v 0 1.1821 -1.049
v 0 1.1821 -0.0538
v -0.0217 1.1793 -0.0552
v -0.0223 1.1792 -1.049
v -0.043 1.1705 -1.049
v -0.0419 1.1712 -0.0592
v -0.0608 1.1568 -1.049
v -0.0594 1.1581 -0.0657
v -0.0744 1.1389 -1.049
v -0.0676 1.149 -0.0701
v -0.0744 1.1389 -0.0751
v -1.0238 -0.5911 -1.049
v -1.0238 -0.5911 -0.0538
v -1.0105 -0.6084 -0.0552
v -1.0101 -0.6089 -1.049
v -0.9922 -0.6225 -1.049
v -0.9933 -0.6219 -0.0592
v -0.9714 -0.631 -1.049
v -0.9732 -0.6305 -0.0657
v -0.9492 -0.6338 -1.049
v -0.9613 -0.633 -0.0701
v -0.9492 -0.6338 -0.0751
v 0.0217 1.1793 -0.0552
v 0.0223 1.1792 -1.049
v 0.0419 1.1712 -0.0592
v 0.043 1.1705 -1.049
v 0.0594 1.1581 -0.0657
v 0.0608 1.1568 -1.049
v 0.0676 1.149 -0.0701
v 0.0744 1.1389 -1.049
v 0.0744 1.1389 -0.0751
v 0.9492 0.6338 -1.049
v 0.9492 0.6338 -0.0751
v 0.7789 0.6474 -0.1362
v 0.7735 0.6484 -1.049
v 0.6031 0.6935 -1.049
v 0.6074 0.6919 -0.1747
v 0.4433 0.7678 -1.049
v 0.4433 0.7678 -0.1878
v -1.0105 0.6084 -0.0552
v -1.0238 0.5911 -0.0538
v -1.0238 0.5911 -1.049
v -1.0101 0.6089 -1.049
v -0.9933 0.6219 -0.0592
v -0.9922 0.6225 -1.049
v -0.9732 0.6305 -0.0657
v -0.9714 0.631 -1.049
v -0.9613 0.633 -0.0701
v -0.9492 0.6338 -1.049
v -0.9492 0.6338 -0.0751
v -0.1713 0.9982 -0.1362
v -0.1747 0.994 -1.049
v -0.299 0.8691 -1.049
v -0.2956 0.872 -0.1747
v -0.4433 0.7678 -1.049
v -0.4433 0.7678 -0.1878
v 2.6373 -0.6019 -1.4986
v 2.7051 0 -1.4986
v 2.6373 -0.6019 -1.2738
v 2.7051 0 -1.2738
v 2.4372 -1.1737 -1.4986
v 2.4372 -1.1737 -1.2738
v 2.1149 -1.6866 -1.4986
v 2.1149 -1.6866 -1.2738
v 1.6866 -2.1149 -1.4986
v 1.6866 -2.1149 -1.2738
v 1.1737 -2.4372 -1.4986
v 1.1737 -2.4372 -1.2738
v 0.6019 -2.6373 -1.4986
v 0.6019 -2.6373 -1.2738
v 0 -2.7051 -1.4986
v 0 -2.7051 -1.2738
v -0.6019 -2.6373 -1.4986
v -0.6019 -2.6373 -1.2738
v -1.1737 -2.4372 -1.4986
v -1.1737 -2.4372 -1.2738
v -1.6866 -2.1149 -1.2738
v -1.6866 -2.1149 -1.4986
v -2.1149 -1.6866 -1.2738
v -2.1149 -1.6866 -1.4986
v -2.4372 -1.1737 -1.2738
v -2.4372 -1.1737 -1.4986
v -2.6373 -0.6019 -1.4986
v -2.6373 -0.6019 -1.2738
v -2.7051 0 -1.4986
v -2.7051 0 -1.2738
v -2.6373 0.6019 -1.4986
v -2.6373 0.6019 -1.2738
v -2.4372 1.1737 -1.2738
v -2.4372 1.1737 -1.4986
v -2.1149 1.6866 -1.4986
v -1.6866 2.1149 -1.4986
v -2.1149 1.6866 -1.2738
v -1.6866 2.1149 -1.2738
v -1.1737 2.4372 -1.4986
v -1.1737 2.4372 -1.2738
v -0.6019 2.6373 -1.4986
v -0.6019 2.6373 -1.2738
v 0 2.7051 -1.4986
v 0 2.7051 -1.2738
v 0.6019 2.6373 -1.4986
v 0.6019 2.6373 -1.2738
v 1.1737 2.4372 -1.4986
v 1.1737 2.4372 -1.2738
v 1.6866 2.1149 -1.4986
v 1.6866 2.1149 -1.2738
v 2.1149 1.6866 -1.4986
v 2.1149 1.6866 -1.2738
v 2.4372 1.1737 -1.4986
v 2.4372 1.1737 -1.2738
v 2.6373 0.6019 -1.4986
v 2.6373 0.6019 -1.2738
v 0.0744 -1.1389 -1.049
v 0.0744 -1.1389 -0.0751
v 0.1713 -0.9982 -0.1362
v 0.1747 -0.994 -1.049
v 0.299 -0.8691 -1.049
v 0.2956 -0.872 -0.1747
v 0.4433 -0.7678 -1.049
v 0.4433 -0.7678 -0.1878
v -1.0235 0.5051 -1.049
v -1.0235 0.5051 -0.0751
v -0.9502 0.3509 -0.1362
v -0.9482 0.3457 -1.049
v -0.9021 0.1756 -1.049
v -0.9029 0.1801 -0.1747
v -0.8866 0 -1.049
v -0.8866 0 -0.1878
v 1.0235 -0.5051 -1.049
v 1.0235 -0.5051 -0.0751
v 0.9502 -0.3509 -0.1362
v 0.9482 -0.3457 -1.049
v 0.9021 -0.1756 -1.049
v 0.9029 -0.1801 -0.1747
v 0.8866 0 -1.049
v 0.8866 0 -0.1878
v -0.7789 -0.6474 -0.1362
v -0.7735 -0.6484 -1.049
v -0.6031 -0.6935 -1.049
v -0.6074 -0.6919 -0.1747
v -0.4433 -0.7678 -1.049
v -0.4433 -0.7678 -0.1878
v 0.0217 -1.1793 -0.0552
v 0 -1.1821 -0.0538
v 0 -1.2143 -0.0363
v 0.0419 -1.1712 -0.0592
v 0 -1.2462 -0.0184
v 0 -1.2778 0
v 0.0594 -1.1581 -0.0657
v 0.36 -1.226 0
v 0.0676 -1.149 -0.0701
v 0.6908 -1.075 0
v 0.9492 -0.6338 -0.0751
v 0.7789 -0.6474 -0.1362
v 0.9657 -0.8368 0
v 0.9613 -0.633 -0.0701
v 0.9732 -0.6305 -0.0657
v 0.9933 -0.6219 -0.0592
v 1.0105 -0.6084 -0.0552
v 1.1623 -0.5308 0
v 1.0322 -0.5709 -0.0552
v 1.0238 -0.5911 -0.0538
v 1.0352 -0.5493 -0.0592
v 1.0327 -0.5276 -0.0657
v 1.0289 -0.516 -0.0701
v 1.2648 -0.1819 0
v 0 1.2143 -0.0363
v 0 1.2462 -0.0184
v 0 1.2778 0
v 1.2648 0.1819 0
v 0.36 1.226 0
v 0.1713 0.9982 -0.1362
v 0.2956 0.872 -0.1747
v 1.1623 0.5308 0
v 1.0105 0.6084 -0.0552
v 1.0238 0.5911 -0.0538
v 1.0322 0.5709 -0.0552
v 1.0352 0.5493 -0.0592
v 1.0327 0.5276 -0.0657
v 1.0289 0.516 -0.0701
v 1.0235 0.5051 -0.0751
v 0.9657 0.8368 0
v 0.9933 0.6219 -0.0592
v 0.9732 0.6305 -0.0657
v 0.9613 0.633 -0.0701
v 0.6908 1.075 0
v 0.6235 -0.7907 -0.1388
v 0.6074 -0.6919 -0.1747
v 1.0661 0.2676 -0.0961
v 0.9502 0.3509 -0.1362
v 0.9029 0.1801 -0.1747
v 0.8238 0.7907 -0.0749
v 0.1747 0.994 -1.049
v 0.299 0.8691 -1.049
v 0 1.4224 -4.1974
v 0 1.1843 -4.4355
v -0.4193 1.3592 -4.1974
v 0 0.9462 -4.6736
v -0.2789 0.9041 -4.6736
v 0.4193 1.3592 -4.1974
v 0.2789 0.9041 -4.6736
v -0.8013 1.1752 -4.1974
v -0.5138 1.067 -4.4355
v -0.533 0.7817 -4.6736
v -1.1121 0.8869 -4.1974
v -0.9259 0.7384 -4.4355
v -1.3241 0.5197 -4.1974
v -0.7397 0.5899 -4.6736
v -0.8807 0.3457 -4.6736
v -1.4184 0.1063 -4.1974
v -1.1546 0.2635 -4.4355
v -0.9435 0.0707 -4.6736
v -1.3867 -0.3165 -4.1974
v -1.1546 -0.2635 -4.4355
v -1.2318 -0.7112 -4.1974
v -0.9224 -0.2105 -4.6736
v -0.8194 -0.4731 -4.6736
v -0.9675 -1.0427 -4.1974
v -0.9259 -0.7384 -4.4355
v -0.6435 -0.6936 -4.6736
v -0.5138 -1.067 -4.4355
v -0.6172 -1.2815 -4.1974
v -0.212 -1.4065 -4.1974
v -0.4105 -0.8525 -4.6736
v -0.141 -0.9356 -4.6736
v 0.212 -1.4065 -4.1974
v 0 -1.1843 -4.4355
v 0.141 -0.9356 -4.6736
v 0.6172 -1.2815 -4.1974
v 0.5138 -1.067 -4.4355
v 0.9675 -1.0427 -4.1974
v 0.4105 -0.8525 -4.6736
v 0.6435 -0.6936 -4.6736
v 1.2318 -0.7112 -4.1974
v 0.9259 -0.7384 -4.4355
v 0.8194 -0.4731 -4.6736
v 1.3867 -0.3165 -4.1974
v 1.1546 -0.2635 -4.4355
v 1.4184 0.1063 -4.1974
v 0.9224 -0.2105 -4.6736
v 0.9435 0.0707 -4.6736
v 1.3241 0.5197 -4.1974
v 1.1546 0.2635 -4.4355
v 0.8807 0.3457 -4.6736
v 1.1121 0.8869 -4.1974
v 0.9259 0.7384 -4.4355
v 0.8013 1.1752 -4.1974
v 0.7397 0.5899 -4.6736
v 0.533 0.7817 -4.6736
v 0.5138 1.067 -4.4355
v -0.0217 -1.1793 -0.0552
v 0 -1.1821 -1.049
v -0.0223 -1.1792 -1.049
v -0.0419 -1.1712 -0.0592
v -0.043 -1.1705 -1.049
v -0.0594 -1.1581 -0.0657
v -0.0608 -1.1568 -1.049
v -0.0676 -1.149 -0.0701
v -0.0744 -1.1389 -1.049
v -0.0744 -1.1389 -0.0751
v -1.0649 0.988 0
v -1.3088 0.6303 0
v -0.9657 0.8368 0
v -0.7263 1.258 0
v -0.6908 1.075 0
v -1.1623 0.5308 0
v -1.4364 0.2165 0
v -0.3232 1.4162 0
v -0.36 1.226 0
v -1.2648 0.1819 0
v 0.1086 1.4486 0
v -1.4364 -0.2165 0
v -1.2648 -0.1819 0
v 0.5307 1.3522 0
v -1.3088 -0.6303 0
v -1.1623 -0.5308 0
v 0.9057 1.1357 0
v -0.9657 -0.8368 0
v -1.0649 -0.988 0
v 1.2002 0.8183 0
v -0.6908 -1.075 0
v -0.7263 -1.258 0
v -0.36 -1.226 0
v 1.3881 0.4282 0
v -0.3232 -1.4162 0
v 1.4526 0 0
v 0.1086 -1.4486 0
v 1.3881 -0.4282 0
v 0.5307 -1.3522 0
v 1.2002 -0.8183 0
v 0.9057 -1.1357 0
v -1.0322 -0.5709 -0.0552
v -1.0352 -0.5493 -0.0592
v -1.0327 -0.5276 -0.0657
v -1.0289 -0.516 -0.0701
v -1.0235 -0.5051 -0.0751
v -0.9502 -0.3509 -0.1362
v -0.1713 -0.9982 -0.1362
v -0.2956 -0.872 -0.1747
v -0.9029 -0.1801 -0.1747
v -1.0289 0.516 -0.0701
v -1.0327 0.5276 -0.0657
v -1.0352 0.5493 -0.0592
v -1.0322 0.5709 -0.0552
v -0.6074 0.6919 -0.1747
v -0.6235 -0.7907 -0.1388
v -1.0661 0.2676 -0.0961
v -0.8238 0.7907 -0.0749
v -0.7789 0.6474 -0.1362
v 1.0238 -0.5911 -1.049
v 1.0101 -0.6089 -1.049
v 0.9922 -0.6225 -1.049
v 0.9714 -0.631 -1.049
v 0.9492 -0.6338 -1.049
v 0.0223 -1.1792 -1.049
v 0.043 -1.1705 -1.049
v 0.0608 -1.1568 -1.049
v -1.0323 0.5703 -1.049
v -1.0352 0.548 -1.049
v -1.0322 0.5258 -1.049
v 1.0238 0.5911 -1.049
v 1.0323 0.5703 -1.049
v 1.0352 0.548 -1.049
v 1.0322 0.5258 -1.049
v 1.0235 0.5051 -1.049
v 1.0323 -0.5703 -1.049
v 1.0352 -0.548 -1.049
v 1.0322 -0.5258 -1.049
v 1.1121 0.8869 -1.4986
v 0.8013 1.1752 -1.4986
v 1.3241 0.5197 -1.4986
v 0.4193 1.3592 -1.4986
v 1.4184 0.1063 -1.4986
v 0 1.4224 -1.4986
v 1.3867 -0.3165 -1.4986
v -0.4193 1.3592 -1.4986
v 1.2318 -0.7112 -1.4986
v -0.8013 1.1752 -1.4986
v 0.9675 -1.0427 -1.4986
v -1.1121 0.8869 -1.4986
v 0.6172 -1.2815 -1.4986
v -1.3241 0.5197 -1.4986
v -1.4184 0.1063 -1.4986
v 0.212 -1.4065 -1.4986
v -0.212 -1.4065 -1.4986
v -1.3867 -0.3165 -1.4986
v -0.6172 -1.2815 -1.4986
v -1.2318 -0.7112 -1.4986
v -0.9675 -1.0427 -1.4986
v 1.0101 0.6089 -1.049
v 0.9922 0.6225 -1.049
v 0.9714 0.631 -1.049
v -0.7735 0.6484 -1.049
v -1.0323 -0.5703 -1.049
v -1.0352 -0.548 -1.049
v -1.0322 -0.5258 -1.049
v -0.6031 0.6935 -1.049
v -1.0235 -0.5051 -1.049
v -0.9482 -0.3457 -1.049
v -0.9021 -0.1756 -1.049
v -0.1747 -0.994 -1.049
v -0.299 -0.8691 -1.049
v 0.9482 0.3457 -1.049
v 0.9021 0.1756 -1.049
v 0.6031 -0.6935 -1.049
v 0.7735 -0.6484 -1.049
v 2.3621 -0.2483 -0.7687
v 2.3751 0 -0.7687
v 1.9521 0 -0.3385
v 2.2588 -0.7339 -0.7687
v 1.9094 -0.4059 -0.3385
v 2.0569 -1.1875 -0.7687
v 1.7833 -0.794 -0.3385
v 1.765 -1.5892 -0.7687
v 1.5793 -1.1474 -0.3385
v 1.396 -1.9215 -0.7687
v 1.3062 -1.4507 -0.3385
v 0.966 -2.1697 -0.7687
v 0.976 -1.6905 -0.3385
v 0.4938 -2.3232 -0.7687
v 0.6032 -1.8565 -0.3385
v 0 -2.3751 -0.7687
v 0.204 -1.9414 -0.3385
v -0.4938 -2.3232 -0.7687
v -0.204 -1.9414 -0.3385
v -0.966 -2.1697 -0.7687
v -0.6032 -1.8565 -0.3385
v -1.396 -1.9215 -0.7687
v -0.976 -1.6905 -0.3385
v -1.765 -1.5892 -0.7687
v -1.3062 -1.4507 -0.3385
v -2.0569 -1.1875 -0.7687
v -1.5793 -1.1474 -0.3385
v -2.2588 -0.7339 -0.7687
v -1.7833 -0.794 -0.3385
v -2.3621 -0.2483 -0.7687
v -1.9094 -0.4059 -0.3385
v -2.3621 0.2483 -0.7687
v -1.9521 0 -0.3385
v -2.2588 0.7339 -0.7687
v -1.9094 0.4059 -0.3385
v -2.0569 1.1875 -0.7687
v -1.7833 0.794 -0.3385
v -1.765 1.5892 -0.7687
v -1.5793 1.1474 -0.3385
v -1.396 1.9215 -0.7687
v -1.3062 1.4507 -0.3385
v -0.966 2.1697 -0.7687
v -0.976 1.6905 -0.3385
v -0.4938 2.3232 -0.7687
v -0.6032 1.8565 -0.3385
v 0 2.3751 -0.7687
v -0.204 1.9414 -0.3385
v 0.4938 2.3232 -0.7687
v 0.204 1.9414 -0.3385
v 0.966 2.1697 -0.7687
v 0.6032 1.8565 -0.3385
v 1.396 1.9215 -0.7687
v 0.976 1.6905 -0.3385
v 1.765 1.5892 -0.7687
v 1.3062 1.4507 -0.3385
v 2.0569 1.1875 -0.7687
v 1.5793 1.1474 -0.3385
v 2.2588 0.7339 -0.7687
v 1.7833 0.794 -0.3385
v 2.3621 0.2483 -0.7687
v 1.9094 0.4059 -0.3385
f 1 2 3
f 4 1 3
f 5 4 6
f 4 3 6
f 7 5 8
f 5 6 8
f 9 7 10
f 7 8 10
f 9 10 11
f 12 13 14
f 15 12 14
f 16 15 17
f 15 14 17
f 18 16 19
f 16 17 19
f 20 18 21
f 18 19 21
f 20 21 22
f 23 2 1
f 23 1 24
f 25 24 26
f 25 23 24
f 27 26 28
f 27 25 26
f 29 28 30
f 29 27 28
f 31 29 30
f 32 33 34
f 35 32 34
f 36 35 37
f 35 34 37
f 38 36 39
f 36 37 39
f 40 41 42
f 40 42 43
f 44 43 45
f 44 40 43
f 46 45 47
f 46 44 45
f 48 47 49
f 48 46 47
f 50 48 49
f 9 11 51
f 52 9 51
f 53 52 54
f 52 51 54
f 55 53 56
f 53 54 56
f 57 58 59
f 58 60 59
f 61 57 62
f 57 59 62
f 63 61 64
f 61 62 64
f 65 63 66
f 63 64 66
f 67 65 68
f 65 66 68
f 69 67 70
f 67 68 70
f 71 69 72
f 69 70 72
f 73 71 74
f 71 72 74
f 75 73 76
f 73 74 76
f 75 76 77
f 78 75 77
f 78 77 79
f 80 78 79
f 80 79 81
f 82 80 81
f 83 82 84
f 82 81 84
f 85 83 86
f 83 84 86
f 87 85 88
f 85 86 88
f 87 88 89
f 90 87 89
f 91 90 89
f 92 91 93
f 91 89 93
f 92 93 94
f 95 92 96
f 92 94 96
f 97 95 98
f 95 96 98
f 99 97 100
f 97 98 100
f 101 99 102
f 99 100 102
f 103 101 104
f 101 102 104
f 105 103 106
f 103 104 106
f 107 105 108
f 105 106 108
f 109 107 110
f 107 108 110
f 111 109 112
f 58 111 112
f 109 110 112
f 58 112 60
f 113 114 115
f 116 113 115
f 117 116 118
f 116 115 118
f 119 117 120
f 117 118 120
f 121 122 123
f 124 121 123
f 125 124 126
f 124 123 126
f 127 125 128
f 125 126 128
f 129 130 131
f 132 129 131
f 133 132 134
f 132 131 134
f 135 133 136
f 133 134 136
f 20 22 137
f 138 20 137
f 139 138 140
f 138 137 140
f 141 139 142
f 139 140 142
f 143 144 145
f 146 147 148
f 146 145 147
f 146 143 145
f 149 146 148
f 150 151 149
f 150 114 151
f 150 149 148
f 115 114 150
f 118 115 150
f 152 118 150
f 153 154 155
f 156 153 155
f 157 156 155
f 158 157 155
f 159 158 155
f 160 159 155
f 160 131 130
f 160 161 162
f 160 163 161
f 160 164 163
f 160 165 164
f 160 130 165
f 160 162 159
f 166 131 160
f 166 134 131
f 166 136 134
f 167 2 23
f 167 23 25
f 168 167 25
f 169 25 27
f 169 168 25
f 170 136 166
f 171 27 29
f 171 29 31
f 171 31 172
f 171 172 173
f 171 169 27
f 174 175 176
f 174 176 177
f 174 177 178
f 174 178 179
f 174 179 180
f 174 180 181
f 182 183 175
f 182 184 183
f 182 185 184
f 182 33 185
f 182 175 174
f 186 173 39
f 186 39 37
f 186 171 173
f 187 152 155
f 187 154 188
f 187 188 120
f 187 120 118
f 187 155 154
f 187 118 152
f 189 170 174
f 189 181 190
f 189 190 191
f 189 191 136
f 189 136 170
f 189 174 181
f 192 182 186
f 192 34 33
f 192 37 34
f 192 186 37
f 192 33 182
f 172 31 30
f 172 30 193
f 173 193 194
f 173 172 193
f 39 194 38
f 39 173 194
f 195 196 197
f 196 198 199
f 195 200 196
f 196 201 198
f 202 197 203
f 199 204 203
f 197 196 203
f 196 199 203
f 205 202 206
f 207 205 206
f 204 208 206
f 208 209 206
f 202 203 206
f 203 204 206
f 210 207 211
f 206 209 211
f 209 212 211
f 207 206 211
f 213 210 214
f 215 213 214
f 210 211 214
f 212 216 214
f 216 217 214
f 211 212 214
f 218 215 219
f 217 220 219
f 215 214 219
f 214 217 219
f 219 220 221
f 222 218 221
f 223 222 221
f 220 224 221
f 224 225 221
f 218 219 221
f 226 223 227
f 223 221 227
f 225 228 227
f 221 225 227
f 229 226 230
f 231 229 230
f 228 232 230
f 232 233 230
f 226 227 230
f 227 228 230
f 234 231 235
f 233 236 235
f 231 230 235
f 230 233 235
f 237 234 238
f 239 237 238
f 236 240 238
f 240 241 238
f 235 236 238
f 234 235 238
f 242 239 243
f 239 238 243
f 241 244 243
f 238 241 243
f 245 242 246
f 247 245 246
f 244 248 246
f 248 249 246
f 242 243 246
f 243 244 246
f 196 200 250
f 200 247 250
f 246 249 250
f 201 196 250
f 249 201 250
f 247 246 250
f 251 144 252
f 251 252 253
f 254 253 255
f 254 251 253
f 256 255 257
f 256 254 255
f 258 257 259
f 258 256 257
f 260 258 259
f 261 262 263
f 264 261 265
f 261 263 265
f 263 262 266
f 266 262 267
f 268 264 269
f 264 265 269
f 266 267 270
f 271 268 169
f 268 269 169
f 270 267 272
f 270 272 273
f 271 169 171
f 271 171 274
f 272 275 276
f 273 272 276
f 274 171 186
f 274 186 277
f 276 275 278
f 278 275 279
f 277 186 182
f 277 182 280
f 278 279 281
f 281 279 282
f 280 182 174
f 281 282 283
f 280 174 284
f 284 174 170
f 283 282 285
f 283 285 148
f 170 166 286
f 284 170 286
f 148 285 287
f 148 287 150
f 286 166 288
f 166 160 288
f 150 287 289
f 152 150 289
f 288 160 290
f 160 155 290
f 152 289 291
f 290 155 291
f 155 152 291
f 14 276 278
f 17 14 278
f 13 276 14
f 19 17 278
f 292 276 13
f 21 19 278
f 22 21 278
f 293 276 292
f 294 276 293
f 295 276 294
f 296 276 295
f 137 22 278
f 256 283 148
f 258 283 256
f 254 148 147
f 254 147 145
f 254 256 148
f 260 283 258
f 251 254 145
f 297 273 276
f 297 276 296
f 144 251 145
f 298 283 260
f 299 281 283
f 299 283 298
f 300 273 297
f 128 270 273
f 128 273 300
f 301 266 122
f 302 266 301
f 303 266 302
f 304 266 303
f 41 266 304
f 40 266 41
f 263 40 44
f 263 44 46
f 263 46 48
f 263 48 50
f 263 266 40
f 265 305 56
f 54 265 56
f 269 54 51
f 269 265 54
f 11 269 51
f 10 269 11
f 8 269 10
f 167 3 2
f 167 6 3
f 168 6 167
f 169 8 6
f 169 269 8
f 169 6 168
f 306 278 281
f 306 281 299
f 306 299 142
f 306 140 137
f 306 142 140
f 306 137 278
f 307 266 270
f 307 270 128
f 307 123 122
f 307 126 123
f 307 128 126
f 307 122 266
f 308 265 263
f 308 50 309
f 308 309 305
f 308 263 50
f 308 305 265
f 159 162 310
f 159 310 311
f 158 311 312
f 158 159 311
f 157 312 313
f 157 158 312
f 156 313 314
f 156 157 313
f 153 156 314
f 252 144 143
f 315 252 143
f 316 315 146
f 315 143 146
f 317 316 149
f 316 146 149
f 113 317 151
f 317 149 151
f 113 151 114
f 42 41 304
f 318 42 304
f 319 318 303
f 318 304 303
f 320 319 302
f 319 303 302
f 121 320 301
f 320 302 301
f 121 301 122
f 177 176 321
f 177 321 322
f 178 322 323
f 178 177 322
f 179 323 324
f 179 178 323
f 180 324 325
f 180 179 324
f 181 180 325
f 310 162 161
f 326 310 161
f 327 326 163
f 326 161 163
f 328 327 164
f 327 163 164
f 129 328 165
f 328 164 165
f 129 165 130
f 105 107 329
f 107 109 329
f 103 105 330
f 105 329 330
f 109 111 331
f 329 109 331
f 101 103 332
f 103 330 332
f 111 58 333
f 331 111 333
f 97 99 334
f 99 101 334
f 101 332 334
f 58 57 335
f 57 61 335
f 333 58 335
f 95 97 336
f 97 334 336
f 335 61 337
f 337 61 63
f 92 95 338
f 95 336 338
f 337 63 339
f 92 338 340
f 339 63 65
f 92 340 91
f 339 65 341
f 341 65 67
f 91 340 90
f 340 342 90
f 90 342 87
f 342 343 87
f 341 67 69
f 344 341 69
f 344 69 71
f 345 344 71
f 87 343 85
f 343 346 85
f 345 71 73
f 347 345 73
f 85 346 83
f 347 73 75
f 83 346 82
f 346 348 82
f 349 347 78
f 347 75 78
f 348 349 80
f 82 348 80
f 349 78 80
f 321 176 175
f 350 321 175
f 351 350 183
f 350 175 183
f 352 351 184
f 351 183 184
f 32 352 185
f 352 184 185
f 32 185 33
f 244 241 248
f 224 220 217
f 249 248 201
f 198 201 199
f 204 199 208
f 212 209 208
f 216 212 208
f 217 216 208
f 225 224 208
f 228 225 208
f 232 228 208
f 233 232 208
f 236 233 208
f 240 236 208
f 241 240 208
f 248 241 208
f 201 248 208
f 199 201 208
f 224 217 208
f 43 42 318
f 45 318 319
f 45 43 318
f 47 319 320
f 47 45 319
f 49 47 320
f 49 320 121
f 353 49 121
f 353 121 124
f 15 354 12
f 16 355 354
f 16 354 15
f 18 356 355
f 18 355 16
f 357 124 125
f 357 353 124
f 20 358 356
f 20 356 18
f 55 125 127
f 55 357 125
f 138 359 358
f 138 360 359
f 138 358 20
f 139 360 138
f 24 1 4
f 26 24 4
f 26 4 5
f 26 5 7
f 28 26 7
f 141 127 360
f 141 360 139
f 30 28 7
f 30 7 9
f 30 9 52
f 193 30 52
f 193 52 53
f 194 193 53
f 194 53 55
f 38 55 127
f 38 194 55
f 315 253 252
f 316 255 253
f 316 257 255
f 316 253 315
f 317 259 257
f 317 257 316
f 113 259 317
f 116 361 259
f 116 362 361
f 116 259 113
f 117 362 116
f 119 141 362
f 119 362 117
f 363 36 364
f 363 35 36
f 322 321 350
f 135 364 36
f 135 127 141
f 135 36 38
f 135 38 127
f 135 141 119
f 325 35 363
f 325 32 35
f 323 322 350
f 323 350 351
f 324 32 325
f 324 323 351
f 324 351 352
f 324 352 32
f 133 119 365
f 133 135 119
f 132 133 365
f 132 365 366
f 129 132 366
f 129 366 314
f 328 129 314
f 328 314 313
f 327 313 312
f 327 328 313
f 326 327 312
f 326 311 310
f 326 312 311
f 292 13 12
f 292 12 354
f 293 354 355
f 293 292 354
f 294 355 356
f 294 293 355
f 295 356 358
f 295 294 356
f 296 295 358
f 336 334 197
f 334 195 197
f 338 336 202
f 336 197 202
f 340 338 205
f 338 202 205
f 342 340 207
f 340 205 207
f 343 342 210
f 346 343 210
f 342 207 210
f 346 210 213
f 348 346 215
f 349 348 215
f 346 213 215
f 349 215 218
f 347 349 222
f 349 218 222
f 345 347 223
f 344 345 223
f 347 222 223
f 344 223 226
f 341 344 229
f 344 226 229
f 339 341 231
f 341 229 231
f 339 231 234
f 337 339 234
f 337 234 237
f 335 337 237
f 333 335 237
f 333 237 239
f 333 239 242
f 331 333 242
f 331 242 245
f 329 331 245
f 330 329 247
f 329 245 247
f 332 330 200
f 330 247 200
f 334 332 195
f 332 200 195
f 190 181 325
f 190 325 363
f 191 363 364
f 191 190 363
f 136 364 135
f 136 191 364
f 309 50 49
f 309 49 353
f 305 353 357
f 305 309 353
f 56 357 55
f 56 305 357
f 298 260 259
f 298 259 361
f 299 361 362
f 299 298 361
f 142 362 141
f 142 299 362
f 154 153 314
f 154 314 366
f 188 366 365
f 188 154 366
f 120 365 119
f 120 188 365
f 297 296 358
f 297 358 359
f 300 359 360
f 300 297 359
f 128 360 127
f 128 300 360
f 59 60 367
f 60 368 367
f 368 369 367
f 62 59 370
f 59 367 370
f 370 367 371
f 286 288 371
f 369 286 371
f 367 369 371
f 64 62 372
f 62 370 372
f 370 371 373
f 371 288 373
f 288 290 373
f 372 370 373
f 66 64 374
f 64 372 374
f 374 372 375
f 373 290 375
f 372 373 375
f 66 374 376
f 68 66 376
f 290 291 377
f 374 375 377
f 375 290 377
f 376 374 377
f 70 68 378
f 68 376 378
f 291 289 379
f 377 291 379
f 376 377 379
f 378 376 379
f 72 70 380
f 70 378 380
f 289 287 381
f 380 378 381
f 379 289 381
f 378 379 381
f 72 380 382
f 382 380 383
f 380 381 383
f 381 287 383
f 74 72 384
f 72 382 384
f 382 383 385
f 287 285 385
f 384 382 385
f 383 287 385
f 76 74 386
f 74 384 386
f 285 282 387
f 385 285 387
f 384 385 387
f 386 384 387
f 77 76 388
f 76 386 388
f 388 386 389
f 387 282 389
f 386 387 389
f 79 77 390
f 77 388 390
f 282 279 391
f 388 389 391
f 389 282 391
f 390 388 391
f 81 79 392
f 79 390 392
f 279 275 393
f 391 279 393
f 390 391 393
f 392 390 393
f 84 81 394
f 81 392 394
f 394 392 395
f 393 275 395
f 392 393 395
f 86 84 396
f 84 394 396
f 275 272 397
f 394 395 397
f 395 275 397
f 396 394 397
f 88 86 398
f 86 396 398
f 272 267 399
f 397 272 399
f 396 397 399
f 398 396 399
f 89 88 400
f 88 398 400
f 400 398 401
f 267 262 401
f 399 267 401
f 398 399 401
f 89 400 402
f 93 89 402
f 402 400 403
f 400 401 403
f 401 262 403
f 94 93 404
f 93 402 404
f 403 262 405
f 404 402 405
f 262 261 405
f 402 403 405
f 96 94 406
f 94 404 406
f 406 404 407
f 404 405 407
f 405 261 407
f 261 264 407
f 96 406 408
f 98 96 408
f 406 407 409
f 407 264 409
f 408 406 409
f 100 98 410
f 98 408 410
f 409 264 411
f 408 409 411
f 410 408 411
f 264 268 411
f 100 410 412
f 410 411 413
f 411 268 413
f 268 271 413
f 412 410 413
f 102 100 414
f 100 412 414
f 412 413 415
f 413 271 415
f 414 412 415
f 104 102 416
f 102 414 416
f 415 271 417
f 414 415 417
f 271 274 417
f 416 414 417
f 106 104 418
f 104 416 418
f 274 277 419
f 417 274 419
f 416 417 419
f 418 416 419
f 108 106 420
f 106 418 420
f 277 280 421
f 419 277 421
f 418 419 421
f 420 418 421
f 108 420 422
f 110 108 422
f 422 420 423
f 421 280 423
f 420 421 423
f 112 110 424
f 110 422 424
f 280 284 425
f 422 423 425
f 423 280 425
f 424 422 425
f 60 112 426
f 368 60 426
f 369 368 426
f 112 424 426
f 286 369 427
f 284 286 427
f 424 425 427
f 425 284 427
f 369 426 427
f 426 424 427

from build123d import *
from build123d.topology import SkipClean

# Parameters (mm, degrees)
CUT_EXTRUDE1_DEPTH       = 1.04902
CIRPATTERN1_COUNT        = 6
CIRPATTERN1_COPY_1_DEPTH = 1.04902
CIRPATTERN1_COPY_2_DEPTH = 1.04902
CIRPATTERN1_COPY_3_DEPTH = 1.04902
CIRPATTERN1_COPY_4_DEPTH = 1.04902
CIRPATTERN1_COPY_5_DEPTH = 1.04902


with BuildPart() as part:
    # Sketch2 → Revolve1 (revolve)
    with BuildSketch(Plane(origin=(0, 0, 0), x_dir=(0, 0, -1), z_dir=(1, 0, 0))):
        Polygon((1.4986, 1.4224), (4.19735, 1.4224), (4.6736, 0.94615), (4.6736, 0), (1.4986, 0), align=None)
    revolve(axis=Axis((0, 0, -4.6736), (0, 0, 1)))


with BuildPart() as body_2:
    # Sketch3 → Revolve2 (revolve)
    with BuildSketch(Plane(origin=(0, 0, 0), x_dir=(0, 0, -1), z_dir=(1, 0, 0))):
        with BuildLine():
            Line((1.4986, 0), (1.4986, 2.7051))
            Line((1.4986, 2.7051), (1.27381, 2.7051))
            ThreePointArc((1.27381, 2.7051), (0.543126817, 2.17424602), (0, 1.4526387))
            Line((0, 1.4526387), (0, 0))
            Line((0, 0), (1.4986, 0))
        make_face()
    revolve(axis=Axis((0, 0, 0), (0, 0, -1)))

    # Combine1: union part
    add(part.part)

    # Sketch4 → Cut-Extrude1 (cut)
    with BuildSketch(Plane.XY):
        with BuildLine():
            Line((-0.886596525, 0), (0, 0))
            Line((0, 0), (-1.023753485, 0.59106435))
            ThreePointArc((-1.023753485, 0.59106435), (-1.035216975, 0.548031955), (-1.023503515, 0.505066928))
            ThreePointArc((-1.023503515, 0.505066928), (-0.921429906, 0.261646769), (-0.886596525, 0))
        make_face()
    cut_extrude1 = extrude(amount=-CUT_EXTRUDE1_DEPTH, mode=Mode.SUBTRACT)

    # Mirror1: Cut-Extrude1 across plane
    add(cut_extrude1.mirror(Plane.ZX), mode=Mode.SUBTRACT)

    # CirPattern1: Cut-Extrude1 ×6 about axis
    cirpattern1_axis = Axis((0, 0, -4.6736), (0, 0, -1))
    for i in range(1, CIRPATTERN1_COUNT):
        add(cut_extrude1.rotate(cirpattern1_axis, i * 360 / CIRPATTERN1_COUNT), mode=Mode.SUBTRACT)

    # CirPattern1 copy 1 sketch → CirPattern1 copy 1 (cut)
    with BuildSketch(Plane(origin=(0, 0, 0), x_dir=(0.5000000000000001, -0.8660254037844386, 0), z_dir=(0, 0, 1))):
        with BuildLine():
            Line((-0.886596525, 0), (0, 0))
            Line((0, 0), (-1.023753485, -0.59106435))
            ThreePointArc((-1.023753485, -0.59106435), (-1.035216975, -0.548031955), (-1.023503515, -0.505066928))
            ThreePointArc((-1.023503515, -0.505066928), (-0.921429906, -0.261646769), (-0.886596525, 0))
        make_face()
    extrude(amount=-CIRPATTERN1_COPY_1_DEPTH, mode=Mode.SUBTRACT)

    # CirPattern1 copy 2 sketch → CirPattern1 copy 2 (cut)
    with BuildSketch(Plane(origin=(0, 0, 0), x_dir=(-0.4999999999999998, -0.8660254037844387, 0), z_dir=(0, 0, 1))):
        with BuildLine():
            Line((-0.886596525, 0), (0, 0))
            Line((0, 0), (-1.023753485, -0.59106435))
            ThreePointArc((-1.023753485, -0.59106435), (-1.035216975, -0.548031955), (-1.023503515, -0.505066928))
            ThreePointArc((-1.023503515, -0.505066928), (-0.921429906, -0.261646769), (-0.886596525, 0))
        make_face()
    extrude(amount=-CIRPATTERN1_COPY_2_DEPTH, mode=Mode.SUBTRACT)

    # CirPattern1 copy 3 sketch → CirPattern1 copy 3 (cut)
    with BuildSketch(Plane(origin=(0, 0, 0), x_dir=(-1, 0, 0), z_dir=(0, 0, 1))):
        with BuildLine():
            Line((-0.886596525, 0), (0, 0))
            Line((0, 0), (-1.023753485, -0.59106435))
            ThreePointArc((-1.023753485, -0.59106435), (-1.035216975, -0.548031955), (-1.023503515, -0.505066928))
            ThreePointArc((-1.023503515, -0.505066928), (-0.921429906, -0.261646769), (-0.886596525, 0))
        make_face()
    extrude(amount=-CIRPATTERN1_COPY_3_DEPTH, mode=Mode.SUBTRACT)

    # CirPattern1 copy 4 sketch → CirPattern1 copy 4 (cut)
    with BuildSketch(Plane(origin=(0, 0, 0), x_dir=(-0.5000000000000004, 0.8660254037844384, 0), z_dir=(0, 0, 1))):
        with BuildLine():
            Line((-0.886596525, 0), (0, 0))
            Line((0, 0), (-1.023753485, -0.59106435))
            ThreePointArc((-1.023753485, -0.59106435), (-1.035216975, -0.548031955), (-1.023503515, -0.505066928))
            ThreePointArc((-1.023503515, -0.505066928), (-0.921429906, -0.261646769), (-0.886596525, 0))
        make_face()
    extrude(amount=-CIRPATTERN1_COPY_4_DEPTH, mode=Mode.SUBTRACT)

    # CirPattern1 copy 5 sketch → CirPattern1 copy 5 (cut)
    with BuildSketch(Plane(origin=(0, 0, 0), x_dir=(0.5000000000000001, 0.8660254037844386, 0), z_dir=(0, 0, 1))):
        with BuildLine():
            Line((-0.886596525, 0), (0, 0))
            Line((0, 0), (-1.023753485, -0.59106435))
            ThreePointArc((-1.023753485, -0.59106435), (-1.035216975, -0.548031955), (-1.023503515, -0.505066928))
            ThreePointArc((-1.023503515, -0.505066928), (-0.921429906, -0.261646769), (-0.886596525, 0))
        make_face()
    extrude(amount=-CIRPATTERN1_COPY_5_DEPTH, mode=Mode.SUBTRACT)

    # Sketch5 → Cut-Revolve1 (revolve, cut)
    with SkipClean():  # the faces are left unmerged after this step: merging them gives an invalid solid
        with BuildSketch(Plane(origin=(0, 0, 0), x_dir=(0, 0, -1), z_dir=(1, 0, 0))):
            with BuildLine():
                Line((-2.159882457, 2.50955579), (-2.159882457, -2.50955579))
                ThreePointArc((-2.159882457, -2.50955579), (0.349673333, 0), (-2.159882457, 2.50955579))
            make_face()
        revolve(axis=Axis((0, 2.50955579, 2.159882457), (0, -1, 0)), mode=Mode.SUBTRACT)


solid = body_2.part
